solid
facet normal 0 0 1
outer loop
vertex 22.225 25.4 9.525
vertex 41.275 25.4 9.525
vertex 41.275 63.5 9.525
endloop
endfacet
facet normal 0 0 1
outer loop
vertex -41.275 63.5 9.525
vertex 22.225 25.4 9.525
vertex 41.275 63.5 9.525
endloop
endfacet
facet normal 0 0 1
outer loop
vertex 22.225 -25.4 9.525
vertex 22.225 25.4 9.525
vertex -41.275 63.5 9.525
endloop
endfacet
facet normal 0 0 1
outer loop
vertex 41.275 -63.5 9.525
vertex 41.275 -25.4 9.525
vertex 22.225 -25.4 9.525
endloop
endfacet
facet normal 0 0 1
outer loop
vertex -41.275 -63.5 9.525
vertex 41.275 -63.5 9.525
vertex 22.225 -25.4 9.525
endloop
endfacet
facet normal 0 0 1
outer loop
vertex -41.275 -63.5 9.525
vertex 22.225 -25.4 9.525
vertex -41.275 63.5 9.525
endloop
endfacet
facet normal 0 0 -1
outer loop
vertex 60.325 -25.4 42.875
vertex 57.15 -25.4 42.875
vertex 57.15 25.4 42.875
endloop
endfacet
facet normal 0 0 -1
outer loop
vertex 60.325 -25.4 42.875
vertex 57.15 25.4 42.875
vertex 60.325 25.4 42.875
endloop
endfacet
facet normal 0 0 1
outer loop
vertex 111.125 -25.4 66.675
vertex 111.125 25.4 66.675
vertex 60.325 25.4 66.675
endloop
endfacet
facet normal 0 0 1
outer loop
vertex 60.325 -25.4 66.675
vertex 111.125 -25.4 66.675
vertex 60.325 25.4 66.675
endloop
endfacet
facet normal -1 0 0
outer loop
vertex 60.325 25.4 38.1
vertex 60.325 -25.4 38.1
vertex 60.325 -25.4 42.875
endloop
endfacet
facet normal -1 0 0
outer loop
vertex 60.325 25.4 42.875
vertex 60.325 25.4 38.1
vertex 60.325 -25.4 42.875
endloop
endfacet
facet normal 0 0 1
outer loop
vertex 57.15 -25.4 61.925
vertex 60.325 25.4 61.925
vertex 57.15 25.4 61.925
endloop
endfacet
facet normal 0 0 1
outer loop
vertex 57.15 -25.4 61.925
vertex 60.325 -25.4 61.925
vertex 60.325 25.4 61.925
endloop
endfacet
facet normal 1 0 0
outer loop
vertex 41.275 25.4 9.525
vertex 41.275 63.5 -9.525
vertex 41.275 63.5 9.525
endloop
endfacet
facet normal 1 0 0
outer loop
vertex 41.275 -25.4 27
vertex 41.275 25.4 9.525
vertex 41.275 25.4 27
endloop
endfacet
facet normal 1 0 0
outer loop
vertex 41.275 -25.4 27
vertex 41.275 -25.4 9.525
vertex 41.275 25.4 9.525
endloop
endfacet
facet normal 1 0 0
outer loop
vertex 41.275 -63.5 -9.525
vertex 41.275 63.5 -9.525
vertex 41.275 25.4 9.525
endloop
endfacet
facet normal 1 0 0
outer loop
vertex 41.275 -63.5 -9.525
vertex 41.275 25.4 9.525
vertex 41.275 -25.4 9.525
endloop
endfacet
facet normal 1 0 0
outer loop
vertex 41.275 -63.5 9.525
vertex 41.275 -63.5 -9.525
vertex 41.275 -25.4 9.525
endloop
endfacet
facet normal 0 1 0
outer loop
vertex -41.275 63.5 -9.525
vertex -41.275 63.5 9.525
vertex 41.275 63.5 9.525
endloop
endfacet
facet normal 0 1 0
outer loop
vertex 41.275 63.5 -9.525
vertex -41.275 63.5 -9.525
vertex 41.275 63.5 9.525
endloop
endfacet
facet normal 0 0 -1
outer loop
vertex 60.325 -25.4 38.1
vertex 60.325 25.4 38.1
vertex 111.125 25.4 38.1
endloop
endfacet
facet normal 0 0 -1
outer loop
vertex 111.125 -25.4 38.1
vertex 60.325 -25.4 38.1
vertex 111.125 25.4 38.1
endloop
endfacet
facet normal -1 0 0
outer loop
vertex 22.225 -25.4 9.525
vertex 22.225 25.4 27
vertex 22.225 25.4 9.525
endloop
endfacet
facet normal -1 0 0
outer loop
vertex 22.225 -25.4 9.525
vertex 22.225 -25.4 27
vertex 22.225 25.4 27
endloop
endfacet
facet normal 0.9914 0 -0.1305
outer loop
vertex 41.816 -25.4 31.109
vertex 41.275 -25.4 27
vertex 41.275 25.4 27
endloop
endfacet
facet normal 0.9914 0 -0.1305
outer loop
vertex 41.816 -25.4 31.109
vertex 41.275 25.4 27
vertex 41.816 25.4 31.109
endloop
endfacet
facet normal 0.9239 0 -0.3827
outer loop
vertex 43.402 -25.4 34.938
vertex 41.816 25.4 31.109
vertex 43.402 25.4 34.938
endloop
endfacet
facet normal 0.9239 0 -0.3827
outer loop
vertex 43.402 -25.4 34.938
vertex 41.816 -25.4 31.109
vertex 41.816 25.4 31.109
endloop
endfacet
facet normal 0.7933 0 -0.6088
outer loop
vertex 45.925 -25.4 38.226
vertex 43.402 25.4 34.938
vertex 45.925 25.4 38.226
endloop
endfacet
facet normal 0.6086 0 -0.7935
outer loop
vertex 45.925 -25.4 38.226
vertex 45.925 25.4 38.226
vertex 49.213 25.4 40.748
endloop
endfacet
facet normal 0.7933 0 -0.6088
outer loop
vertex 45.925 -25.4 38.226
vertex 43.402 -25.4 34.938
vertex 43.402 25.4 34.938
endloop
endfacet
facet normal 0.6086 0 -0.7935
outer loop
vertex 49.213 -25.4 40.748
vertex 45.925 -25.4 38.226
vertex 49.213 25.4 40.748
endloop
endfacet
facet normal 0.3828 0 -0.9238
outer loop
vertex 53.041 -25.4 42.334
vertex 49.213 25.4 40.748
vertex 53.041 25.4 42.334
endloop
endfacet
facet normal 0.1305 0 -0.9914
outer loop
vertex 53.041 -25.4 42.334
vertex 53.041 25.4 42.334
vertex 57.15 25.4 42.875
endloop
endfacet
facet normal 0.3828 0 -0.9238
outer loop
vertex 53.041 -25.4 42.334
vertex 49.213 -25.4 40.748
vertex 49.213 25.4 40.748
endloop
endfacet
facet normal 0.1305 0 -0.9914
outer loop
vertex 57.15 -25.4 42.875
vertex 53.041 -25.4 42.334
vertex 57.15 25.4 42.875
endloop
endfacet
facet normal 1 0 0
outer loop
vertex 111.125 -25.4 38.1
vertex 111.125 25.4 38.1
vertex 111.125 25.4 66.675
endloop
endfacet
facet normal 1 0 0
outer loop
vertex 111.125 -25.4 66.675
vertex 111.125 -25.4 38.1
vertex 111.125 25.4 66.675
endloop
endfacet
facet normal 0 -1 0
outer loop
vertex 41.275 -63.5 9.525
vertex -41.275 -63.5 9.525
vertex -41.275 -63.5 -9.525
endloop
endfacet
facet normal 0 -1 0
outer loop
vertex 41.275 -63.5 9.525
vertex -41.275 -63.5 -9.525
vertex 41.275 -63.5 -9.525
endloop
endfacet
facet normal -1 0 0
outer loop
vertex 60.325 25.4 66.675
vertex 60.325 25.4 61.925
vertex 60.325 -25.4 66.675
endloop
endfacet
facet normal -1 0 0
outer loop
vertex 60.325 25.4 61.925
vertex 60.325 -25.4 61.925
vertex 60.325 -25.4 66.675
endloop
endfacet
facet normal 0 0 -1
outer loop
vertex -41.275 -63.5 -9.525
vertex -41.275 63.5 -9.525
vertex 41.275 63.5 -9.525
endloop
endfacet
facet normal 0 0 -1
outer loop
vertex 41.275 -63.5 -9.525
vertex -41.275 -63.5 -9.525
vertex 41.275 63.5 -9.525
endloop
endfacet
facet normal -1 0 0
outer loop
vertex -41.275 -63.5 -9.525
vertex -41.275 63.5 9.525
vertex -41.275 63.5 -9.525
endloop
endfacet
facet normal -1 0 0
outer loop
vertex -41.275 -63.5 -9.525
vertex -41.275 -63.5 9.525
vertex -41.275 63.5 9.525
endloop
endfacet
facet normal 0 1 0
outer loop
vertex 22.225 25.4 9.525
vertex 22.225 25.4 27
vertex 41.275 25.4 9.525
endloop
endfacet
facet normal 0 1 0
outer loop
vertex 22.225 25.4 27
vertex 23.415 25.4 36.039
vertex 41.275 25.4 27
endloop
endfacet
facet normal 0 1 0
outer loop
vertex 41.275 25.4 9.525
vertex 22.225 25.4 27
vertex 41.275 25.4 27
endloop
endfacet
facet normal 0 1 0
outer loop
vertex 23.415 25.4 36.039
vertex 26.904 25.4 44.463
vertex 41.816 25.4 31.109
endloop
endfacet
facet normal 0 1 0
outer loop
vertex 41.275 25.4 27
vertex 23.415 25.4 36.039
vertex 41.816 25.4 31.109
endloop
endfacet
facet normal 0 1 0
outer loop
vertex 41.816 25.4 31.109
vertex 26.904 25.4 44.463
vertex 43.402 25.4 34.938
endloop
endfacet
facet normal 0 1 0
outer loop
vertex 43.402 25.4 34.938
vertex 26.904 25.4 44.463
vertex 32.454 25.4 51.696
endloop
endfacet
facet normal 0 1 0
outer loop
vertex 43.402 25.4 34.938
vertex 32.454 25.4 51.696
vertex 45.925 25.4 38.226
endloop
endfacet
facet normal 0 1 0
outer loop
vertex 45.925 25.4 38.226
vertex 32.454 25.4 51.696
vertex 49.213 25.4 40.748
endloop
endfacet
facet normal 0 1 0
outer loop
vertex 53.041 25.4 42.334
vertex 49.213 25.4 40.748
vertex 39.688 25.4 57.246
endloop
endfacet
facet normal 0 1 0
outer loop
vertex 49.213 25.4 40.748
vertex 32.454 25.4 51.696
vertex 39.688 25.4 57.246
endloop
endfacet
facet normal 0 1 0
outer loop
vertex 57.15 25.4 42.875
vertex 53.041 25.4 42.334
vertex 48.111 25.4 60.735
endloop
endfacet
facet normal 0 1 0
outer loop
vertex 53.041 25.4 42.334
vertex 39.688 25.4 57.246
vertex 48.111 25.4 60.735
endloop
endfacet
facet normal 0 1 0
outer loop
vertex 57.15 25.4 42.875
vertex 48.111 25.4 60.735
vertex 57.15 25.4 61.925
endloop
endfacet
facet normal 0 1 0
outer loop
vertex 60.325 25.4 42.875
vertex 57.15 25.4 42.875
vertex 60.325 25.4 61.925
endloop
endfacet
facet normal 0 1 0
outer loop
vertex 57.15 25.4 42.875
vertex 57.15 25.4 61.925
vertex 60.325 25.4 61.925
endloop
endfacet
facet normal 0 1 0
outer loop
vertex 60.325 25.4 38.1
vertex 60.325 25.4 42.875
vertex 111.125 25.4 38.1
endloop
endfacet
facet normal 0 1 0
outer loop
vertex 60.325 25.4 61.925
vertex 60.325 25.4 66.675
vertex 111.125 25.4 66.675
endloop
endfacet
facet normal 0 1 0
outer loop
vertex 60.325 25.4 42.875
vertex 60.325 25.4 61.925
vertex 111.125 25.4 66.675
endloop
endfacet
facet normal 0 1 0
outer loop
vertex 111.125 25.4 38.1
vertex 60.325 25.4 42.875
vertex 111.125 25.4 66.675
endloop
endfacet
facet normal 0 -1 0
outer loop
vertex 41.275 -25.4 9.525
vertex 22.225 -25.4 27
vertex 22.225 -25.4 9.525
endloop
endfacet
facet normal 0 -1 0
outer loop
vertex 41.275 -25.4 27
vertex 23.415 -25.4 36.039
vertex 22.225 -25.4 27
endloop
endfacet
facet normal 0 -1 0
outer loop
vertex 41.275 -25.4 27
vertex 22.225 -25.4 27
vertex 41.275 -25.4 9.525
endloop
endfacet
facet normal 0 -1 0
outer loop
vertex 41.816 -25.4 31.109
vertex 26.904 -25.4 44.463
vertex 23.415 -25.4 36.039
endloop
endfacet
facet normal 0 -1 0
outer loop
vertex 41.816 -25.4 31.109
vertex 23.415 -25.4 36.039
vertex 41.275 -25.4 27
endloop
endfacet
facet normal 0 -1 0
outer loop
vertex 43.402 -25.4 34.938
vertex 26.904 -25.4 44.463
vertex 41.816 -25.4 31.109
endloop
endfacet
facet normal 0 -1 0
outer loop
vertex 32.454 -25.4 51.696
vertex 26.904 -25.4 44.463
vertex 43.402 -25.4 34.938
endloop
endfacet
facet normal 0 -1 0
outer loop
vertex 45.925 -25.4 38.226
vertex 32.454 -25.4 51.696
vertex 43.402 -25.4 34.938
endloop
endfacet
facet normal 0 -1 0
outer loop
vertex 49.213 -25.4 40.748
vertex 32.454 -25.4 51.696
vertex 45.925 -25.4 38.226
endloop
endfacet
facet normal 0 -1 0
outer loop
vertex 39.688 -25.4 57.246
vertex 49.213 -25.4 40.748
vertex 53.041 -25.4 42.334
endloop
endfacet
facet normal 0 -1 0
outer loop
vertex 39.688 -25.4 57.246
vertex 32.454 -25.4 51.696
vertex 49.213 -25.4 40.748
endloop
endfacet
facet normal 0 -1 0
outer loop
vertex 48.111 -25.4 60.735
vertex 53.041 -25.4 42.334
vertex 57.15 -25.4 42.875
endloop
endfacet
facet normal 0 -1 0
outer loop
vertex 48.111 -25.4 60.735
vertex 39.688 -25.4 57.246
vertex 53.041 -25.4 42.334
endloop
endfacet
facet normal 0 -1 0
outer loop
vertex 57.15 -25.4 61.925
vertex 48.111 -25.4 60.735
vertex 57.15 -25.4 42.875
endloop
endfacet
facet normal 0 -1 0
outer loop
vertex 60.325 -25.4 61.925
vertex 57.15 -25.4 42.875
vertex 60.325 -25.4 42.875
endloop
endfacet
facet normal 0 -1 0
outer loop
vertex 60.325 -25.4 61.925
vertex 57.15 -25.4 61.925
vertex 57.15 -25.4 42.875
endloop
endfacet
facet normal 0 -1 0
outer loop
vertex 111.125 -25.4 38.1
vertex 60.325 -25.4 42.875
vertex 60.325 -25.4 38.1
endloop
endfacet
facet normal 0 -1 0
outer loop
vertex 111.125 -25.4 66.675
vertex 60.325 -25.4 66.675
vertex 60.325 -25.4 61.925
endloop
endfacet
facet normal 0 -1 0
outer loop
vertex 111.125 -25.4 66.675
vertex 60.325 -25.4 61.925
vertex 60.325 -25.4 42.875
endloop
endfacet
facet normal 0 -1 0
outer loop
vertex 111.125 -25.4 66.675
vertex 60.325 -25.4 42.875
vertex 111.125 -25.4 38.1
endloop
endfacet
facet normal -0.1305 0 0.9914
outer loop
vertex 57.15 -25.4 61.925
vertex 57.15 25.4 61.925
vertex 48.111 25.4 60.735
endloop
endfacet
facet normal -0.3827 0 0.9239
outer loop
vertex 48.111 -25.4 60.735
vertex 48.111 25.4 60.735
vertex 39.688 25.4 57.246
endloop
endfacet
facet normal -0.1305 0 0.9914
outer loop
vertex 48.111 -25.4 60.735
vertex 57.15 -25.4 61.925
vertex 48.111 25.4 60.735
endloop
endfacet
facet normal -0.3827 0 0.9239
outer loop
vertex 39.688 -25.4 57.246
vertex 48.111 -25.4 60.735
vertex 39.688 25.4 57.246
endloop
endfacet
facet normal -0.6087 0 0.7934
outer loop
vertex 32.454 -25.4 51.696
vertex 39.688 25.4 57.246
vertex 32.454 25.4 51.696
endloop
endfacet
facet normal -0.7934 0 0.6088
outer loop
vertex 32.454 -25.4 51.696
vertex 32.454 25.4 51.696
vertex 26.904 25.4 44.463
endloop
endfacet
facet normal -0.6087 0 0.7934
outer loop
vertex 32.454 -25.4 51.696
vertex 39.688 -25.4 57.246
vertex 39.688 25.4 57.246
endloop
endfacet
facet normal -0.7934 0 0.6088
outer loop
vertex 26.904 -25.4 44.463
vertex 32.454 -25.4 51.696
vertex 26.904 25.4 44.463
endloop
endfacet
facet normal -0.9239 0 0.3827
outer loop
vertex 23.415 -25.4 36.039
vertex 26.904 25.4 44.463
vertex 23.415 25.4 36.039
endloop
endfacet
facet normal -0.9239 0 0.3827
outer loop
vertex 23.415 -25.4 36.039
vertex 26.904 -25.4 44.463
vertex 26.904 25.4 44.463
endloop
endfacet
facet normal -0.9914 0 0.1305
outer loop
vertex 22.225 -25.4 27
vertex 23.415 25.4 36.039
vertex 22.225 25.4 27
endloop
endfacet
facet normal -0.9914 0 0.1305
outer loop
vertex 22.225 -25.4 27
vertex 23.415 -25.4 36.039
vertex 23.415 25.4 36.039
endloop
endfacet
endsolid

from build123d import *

# Parameters (mm, degrees)
F1_DEPTH = 63.5
F0_W     = 25.4
F0_H     = 19.05
F0_H_2   = 4.7498
F0_H_3   = 4.7752
F2_DEPTH = 25.4


with BuildPart() as f1:
    # F0 (on Front) → F1 (new body, symmetric)
    with BuildSketch(Plane.XZ):
        Polygon((22.225, 9.525), (-41.275, 9.525), (-41.275, -9.525), (41.275, -9.525), (41.275, 9.525), align=None)
    extrude(amount=F1_DEPTH, both=True)

    # F0 (on Front) → F2 (join, symmetric)
    with BuildSketch(Plane.XZ):
        with BuildLine():
            Line((22.225, 27.0002), (22.225, 9.525))
            Line((22.225, 9.525), (41.275, 9.525))
            Line((41.275, 9.525), (41.275, 27.0002))
            ThreePointArc((41.275, 27.0002), (45.9246798487, 38.2255201513), (57.15, 42.8752))
            Line((57.15, 42.8752), (60.325, 42.8752))
            Line((60.325, 42.8752), (60.325, 61.9252))
            Line((60.325, 61.9252), (57.15, 61.9252))
            ThreePointArc((57.15, 61.9252), (32.4542956671, 51.6959043329), (22.225, 27.0002))
        make_face()
        Polygon((85.725, 66.675), (85.725, 61.9252), (85.725, 42.8752), (85.725, 38.1), (111.125, 38.1), (111.125, 66.675), align=None)
        with Locations((73.025, 52.4002)):
            Rectangle(F0_W, F0_H)
        with Locations((73.025, 64.3001)):
            Rectangle(F0_W, F0_H_2)
        with Locations((73.025, 40.4876)):
            Rectangle(F0_W, F0_H_3)
    extrude(amount=F2_DEPTH, both=True)


solid = f1.part
